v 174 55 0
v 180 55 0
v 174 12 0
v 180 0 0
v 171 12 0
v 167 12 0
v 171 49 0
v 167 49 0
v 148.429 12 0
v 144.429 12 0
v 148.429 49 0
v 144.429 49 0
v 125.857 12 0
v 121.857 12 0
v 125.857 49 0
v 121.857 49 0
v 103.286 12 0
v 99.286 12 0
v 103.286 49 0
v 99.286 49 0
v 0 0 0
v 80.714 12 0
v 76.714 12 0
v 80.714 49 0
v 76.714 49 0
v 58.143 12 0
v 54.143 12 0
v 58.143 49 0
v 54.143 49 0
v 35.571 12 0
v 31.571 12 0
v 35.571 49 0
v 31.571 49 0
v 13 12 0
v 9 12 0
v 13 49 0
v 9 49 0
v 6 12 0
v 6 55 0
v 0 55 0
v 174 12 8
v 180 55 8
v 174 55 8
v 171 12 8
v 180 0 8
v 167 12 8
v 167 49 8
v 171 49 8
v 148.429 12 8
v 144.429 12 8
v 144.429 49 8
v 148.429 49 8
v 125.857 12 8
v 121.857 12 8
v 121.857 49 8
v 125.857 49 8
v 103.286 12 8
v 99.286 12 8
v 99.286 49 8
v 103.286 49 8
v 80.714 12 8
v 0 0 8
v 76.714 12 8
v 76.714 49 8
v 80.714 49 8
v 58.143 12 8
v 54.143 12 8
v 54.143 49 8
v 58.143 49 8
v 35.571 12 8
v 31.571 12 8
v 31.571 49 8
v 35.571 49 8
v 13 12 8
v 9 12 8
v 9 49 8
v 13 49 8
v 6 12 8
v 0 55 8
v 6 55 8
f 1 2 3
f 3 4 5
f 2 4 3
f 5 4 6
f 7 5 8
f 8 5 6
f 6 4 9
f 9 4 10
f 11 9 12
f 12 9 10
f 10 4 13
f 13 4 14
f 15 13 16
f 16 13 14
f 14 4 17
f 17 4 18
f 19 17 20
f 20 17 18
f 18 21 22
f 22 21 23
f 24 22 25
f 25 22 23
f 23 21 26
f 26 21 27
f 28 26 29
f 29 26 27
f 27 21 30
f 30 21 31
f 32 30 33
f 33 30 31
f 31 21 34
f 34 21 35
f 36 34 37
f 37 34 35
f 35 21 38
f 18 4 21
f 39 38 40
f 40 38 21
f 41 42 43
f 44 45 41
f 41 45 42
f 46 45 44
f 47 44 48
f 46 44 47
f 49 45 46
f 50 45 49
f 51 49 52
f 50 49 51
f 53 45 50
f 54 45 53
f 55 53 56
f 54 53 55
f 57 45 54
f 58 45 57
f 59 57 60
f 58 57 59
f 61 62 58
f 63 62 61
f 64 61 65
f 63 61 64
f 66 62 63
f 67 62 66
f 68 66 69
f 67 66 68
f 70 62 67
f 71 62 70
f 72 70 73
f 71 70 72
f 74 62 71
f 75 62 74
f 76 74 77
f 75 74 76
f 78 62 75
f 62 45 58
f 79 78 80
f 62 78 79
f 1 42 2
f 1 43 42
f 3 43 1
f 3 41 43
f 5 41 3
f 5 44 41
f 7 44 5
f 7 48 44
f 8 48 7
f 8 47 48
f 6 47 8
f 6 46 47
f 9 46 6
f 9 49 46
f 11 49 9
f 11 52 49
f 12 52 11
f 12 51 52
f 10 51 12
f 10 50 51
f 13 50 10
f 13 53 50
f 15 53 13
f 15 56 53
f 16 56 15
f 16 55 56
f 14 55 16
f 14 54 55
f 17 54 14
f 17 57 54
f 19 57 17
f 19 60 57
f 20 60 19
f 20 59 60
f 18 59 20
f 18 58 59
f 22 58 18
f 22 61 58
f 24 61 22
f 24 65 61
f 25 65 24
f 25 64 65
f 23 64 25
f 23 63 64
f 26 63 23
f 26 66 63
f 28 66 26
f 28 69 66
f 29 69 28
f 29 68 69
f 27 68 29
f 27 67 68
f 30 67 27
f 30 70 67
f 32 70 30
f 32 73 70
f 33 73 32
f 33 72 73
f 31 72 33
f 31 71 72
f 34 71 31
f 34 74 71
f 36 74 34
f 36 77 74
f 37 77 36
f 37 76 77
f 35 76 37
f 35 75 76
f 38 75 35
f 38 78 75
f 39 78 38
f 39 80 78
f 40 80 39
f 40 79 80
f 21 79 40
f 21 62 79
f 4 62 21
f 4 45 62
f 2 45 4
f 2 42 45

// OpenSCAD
$fn = 32;

// ----------------------------------------------------------------------
// Guard grille: 8 slats over a 180 x 55 mm plate
// ----------------------------------------------------------------------

// --- parameters (mm) ---
profile_height = 8;       // extrusion height
profile_points = 40;      // points of the closed outline

profile = [[0, 0], [180, 0], [180, 55], [174, 55], [174, 12], [171, 12], [171, 49], [167, 49], [167, 12], [148.429, 12], [148.429, 49], [144.429, 49], [144.429, 12], [125.857, 12], [125.857, 49], [121.857, 49], [121.857, 12], [103.286, 12], [103.286, 49], [99.286, 49], [99.286, 12], [80.714, 12], [80.714, 49], [76.714, 49], [76.714, 12], [58.143, 12], [58.143, 49], [54.143, 49], [54.143, 12], [35.571, 12], [35.571, 49], [31.571, 49], [31.571, 12], [13, 12], [13, 49], [9, 49], [9, 12], [6, 12], [6, 55], [0, 55]];  // single closed polygon, 40 points, counter clockwise

// --- the one profile operation ---
linear_extrude(height = profile_height) polygon(points = profile);
